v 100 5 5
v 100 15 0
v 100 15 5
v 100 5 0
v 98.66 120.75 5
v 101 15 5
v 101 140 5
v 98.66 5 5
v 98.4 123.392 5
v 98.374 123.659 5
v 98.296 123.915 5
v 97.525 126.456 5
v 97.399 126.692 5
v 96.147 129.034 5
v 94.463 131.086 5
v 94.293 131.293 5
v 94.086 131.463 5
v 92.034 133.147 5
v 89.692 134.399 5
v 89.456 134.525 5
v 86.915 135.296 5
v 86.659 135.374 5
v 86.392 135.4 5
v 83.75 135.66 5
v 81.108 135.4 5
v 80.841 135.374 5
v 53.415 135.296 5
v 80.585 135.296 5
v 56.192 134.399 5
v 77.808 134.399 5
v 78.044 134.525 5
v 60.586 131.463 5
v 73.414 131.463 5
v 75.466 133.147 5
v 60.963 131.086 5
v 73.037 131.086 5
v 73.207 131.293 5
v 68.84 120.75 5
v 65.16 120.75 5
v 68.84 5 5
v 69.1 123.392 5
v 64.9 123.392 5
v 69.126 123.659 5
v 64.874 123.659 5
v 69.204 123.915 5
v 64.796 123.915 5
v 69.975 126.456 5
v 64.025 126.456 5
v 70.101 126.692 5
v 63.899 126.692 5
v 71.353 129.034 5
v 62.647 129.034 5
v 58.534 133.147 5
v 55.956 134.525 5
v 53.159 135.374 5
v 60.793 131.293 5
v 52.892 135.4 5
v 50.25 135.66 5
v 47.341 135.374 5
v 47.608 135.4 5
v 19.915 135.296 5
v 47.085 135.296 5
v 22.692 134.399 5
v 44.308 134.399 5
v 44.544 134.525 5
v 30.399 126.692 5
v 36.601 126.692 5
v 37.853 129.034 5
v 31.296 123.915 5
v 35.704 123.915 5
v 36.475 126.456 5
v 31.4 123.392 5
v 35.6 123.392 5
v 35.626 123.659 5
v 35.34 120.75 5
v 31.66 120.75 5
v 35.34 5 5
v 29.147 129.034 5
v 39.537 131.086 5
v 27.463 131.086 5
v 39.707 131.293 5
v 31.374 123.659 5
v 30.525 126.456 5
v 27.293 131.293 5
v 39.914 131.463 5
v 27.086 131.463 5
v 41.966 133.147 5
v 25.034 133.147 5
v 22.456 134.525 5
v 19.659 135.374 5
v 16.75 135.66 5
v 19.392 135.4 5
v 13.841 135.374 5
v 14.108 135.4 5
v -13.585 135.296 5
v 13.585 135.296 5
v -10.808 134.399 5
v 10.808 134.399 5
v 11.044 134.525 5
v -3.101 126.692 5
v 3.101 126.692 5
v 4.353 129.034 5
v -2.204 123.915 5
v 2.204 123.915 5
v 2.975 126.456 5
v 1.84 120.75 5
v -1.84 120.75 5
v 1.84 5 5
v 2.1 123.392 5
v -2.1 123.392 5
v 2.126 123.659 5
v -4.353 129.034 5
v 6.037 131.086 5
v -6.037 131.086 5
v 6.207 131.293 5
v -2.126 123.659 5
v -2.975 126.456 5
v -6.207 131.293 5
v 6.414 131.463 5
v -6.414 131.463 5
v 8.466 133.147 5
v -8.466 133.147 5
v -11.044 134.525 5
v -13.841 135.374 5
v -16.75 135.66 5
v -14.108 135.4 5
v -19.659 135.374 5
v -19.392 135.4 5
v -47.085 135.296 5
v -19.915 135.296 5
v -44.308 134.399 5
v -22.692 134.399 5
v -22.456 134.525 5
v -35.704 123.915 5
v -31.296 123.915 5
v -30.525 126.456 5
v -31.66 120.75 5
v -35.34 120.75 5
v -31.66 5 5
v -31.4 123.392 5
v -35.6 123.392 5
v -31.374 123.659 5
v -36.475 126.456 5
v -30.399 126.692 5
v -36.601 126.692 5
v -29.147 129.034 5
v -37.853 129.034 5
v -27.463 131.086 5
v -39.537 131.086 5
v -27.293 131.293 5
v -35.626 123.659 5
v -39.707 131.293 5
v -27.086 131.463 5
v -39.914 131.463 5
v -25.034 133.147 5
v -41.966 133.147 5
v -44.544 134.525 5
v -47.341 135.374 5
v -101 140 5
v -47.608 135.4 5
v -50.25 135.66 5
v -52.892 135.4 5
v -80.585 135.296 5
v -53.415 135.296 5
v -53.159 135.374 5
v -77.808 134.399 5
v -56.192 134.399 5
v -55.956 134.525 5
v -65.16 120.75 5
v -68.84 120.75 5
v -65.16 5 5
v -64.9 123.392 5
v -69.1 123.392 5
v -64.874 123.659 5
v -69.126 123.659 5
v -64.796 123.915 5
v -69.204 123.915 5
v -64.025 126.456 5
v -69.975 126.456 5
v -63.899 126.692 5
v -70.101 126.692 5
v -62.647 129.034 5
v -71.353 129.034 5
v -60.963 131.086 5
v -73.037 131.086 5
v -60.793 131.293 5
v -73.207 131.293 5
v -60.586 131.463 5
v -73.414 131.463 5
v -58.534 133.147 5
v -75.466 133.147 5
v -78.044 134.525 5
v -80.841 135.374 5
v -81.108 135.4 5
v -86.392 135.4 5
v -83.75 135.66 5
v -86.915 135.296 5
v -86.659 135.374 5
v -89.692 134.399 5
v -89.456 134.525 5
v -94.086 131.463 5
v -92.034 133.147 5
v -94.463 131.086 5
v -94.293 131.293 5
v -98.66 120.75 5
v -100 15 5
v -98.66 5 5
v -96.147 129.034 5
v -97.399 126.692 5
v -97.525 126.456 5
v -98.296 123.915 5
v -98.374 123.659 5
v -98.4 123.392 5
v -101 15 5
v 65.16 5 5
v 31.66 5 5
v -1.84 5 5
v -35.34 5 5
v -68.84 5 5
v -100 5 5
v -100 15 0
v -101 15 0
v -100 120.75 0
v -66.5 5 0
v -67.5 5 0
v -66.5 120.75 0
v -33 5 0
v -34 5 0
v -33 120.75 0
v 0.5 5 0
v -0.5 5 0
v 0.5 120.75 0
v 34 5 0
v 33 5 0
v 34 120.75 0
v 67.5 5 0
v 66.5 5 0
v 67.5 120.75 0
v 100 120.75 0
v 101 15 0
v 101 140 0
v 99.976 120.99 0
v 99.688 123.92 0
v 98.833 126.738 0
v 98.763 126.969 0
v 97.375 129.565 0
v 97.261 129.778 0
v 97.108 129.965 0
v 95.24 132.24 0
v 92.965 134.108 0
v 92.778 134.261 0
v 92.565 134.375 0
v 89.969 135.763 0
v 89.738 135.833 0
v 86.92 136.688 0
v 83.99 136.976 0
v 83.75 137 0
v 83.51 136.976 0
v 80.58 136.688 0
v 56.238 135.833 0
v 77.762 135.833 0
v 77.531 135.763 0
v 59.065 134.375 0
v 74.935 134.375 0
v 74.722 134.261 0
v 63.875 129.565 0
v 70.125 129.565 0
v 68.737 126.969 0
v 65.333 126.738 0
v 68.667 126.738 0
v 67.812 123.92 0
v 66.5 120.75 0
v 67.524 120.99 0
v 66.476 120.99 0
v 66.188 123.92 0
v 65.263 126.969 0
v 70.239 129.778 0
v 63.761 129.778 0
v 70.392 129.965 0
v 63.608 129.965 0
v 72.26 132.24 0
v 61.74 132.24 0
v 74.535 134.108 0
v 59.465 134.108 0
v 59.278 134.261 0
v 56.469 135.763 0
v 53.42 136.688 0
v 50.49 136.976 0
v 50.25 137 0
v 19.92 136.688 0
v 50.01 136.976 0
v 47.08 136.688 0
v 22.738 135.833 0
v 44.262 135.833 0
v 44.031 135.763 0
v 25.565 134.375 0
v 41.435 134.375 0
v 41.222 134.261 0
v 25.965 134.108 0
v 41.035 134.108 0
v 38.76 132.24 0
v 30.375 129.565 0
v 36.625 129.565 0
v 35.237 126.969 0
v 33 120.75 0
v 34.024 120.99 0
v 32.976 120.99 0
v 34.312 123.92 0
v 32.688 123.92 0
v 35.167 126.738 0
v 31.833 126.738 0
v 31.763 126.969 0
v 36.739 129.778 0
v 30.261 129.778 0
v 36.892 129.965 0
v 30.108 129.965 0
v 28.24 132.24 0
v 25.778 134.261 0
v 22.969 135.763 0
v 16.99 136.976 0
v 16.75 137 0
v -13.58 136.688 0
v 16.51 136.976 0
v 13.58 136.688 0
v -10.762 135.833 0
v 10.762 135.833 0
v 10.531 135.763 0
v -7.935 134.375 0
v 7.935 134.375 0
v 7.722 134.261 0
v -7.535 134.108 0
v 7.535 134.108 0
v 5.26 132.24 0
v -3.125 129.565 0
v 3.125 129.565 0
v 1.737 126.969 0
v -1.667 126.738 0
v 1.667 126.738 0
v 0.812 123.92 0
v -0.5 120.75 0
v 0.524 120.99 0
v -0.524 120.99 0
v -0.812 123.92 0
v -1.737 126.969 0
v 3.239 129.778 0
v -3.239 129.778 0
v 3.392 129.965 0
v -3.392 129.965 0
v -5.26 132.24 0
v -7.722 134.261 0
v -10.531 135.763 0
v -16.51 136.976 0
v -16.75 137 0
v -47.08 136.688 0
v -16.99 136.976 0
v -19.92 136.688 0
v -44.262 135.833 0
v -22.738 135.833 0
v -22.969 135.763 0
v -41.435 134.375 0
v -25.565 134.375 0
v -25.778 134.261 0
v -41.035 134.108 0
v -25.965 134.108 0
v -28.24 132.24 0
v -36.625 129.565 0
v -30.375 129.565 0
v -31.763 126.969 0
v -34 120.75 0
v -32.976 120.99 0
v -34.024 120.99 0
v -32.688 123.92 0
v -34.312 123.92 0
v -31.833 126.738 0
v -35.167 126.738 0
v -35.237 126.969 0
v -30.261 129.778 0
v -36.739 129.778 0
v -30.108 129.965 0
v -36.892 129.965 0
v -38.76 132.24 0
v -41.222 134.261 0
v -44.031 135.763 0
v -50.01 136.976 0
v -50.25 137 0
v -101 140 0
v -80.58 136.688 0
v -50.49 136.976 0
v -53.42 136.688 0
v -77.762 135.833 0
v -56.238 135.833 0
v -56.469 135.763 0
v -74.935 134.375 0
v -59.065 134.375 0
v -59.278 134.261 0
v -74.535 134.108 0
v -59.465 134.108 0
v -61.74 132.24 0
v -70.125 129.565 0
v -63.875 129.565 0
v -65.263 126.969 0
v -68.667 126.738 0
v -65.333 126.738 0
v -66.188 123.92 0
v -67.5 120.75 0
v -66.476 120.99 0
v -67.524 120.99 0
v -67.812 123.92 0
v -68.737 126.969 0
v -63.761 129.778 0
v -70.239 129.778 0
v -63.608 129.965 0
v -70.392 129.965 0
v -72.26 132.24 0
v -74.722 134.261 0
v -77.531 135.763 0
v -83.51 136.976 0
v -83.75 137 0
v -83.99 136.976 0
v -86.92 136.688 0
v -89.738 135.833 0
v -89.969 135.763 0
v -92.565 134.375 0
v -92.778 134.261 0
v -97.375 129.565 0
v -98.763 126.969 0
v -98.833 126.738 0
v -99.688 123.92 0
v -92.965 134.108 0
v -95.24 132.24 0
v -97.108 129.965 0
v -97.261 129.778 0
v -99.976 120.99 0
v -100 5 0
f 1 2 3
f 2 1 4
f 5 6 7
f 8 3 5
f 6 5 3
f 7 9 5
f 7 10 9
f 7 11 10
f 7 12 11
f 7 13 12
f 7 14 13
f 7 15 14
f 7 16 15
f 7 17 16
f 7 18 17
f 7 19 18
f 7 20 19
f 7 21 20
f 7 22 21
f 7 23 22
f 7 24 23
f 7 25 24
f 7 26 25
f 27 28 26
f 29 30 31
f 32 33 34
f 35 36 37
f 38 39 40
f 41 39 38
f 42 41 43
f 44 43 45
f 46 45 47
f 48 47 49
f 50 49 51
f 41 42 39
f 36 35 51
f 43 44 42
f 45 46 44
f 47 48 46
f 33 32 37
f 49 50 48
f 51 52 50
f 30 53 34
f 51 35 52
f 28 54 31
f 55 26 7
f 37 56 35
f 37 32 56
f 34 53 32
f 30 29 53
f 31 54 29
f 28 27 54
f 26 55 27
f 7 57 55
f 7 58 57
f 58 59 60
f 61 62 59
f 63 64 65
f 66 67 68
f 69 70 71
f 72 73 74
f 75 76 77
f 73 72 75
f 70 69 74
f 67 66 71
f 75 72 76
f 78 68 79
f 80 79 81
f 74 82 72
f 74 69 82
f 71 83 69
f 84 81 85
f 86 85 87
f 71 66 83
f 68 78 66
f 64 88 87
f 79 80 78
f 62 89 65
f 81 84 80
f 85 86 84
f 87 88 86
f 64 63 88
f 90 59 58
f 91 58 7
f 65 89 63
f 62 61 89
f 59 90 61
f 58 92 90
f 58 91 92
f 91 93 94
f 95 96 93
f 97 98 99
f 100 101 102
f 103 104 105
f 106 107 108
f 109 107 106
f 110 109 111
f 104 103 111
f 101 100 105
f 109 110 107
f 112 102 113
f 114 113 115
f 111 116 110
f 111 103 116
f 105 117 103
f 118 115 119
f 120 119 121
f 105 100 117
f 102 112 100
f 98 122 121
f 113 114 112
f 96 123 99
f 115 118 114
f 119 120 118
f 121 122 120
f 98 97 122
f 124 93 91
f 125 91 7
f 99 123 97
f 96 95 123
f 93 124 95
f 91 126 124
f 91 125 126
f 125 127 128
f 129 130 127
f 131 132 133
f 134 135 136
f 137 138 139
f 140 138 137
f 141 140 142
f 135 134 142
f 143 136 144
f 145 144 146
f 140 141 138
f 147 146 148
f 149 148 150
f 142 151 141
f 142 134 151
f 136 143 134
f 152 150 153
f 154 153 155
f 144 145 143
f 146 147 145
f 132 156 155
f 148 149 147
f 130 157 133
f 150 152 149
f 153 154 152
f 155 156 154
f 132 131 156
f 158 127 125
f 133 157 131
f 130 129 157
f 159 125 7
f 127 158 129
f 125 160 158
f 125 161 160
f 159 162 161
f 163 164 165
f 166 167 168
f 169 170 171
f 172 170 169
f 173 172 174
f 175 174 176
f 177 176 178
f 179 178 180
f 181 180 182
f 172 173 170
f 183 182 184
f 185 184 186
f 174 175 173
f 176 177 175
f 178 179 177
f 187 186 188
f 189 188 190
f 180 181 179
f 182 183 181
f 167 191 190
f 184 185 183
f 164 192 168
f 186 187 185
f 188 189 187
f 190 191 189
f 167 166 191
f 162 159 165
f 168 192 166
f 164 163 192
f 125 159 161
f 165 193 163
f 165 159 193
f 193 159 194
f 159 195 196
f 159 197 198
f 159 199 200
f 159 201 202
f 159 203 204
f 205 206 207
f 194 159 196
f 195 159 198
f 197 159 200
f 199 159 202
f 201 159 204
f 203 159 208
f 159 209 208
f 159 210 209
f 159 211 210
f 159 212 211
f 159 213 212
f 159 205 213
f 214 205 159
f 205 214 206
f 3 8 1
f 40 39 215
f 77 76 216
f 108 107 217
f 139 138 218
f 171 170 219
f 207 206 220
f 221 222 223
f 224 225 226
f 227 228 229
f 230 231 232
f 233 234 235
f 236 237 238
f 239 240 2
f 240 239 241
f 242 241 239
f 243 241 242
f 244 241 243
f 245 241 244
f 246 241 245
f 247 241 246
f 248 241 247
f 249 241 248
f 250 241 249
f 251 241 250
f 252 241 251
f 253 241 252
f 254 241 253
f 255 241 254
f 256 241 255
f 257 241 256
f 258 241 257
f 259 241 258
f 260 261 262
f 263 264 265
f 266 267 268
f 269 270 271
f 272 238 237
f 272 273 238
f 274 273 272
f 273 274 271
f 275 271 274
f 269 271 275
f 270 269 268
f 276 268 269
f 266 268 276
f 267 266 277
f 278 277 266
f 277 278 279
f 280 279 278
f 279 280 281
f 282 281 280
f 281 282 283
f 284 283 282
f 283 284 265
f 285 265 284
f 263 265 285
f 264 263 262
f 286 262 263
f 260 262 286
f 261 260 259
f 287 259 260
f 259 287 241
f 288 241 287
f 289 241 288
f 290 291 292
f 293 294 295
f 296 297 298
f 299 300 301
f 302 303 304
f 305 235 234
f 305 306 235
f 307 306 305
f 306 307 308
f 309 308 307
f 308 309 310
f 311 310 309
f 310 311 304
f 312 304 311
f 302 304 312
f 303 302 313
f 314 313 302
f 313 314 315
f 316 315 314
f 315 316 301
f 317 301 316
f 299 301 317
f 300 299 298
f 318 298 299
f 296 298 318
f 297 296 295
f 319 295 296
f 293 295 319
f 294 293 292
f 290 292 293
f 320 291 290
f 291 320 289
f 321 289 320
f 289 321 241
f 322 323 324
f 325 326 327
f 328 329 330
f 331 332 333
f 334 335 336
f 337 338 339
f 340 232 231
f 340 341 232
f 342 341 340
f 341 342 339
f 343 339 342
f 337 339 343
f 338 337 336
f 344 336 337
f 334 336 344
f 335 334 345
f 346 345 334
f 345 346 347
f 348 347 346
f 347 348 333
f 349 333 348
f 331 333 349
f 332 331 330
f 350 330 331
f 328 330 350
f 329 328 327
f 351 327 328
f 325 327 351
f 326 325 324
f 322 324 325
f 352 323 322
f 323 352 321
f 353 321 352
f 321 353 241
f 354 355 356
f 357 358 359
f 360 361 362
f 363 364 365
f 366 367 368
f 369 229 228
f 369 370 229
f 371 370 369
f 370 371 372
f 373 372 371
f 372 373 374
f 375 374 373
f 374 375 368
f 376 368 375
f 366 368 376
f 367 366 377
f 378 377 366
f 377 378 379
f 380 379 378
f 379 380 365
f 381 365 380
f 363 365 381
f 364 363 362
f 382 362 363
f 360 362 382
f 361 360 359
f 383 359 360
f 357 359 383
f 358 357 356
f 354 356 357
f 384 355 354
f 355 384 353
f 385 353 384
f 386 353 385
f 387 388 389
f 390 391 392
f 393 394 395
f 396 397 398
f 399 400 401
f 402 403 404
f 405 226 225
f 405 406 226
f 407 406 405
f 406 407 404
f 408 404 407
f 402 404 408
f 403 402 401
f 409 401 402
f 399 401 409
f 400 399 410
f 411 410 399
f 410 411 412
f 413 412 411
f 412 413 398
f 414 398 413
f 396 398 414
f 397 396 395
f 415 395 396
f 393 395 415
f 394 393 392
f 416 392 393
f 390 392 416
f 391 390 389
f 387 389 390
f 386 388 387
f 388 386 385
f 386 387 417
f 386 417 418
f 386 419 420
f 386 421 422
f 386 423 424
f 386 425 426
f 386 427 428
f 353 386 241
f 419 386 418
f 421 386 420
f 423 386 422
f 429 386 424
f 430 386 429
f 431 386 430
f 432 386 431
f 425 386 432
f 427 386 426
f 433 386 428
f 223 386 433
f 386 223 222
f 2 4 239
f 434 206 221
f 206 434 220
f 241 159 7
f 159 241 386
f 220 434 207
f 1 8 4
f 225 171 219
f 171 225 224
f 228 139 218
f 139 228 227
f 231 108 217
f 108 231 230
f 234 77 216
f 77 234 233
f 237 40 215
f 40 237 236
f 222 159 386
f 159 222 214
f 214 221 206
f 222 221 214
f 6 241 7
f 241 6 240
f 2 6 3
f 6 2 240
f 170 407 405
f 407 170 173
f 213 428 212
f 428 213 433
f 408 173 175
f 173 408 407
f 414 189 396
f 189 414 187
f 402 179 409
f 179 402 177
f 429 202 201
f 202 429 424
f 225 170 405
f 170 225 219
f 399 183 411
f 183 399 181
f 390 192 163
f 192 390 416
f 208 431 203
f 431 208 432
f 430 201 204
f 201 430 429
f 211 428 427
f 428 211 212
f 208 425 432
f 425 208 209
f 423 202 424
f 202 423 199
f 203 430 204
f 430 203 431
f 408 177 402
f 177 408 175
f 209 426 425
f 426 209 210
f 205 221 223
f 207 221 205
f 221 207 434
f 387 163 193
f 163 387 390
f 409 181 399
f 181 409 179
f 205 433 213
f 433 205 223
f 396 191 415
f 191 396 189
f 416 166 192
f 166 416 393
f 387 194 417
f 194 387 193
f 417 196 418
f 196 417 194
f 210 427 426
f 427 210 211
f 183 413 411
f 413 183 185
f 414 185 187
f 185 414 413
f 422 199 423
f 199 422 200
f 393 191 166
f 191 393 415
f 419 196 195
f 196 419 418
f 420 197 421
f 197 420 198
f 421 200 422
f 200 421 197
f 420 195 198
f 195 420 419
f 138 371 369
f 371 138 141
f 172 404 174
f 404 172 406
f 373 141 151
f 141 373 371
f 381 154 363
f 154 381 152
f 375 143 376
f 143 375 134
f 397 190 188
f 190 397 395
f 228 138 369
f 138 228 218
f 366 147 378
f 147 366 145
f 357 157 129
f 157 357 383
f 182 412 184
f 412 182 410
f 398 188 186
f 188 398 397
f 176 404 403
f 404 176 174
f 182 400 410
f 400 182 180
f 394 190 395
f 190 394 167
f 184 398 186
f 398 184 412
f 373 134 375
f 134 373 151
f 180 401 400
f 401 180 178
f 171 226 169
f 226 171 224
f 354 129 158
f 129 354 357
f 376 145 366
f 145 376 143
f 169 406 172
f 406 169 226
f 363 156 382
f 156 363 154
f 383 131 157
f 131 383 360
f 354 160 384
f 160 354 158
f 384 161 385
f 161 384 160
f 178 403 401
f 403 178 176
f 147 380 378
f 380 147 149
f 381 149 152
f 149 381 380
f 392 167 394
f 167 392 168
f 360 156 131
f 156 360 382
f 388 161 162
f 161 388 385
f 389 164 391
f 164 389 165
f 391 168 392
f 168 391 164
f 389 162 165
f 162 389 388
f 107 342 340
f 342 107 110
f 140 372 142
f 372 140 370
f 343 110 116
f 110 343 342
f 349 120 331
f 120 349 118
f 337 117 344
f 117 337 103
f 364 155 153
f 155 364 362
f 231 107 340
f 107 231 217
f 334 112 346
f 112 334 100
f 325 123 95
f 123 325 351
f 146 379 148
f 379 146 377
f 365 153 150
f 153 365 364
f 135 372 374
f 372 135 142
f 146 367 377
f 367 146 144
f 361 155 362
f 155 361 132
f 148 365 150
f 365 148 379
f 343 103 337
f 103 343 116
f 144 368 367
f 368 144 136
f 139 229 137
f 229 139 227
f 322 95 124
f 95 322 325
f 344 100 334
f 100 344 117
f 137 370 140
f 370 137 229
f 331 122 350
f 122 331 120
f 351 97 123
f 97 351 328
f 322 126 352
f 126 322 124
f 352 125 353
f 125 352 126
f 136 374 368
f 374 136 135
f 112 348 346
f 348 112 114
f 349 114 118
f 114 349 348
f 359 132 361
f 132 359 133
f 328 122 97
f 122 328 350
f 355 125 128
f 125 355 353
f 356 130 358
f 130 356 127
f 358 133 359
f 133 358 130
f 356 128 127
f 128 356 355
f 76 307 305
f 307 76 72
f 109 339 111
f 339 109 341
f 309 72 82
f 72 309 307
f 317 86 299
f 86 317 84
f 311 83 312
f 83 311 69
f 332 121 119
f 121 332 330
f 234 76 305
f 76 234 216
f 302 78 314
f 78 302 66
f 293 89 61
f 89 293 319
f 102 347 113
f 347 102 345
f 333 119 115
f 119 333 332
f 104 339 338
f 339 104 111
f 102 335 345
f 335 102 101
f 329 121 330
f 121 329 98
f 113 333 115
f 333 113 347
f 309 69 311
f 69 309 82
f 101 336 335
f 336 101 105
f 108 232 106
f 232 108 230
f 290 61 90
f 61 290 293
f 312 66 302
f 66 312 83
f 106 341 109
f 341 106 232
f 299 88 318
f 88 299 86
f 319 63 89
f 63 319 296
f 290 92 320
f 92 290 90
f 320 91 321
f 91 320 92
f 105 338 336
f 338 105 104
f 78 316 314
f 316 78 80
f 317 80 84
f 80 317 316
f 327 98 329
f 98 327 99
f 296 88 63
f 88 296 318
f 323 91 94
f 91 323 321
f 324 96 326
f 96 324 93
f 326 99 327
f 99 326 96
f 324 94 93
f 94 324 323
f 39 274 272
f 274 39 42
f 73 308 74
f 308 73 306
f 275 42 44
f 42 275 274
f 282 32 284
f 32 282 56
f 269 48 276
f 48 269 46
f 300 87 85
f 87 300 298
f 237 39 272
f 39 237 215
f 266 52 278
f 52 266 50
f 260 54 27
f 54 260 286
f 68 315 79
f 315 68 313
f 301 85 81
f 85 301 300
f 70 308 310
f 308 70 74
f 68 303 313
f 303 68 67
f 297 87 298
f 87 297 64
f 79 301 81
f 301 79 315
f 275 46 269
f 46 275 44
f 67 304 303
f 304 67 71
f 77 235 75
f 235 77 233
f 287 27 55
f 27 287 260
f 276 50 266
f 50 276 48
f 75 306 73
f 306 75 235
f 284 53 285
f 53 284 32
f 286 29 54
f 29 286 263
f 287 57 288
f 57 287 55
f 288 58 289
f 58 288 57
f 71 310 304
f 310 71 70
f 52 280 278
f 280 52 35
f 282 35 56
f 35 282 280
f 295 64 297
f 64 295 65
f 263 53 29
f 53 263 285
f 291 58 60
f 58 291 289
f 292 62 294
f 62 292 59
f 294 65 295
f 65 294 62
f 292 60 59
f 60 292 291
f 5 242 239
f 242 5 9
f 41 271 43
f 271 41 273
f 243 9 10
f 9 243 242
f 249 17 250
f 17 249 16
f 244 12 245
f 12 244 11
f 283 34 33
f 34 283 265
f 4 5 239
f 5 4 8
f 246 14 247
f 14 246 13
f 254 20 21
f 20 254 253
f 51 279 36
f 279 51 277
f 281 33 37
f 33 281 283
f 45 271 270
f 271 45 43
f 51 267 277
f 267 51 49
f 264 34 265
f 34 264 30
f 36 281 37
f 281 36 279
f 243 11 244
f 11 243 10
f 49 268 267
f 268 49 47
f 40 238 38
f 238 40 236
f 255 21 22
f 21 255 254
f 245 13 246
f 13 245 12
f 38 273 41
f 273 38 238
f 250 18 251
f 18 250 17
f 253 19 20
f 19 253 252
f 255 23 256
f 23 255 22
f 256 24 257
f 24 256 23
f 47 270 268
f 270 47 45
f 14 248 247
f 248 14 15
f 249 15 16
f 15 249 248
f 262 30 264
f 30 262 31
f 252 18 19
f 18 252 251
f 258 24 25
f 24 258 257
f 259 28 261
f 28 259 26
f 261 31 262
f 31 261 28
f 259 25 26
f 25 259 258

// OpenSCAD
// Parametric Tray Dividers for Warhammer Bases
// Generated for the Blank Shelf

/* [Base Settings] */
// Pass a list of slots here to mix sizes natively! e.g. [25, 25, 32, 40]
slot_diameters = [];

// Diameter of the bases you want to hold (in mm) (Fallback if slot_diameters is empty)
base_diameter = 32; 

// Height of the bevel on the base (in mm)
base_bevel_height = 5;

// The angle of the base edge from vertical (Warhammer standard is usually 15-20, measure yours to get exact fit)
base_angle = 15;

/* [Clearances & Barriers] */
// Extra width added to the slot so bases slide easily
clearance = 0.5;

// Width of the dividing walls between each base slot
barrier_width = 1.0;

// Barrier thickness at the back of the tray
back_barrier_width = 3;

// Gap at the open side (front of the tray) to make racks shorter
front_gap = 5;

/* [Shelf Dimensions] */
// Depth of the tray/shelf (from front to back)
shelf_depth = 140;

// Maximum available width of the tray
max_shelf_width = 217.7;

/* [Generation] */
// Number of slots. If -1, it will auto-calculate standard slots. (Fallback if slot_diameters is empty)
number_of_slots = -1; 

// Base connecting plate thickness (0 means separate rails connected only at the back, just like the image)
base_plate_thickness = 0;

// Merge the generated dividers physically with the Blank Shelf base?
merge_shelf = false;

// Offset to precisely perfectly the fusion (e.g. 0 sets floor at middle, 0.1 shifts shelf up)
shelf_z_offset = 0.1;

/* [Hidden] */
$fn = 32;

// Auto-calculate slots if using legacy mode
eff_dia = base_diameter + clearance;
slot_width = eff_dia + barrier_width;
n_slots_auto = floor((max_shelf_width - barrier_width) / slot_width);
n_slots_legacy = (number_of_slots > 0) ? number_of_slots : n_slots_auto;

// Identify active slots
active_slots = (len(slot_diameters) > 0) ? slot_diameters : [for (i=[1:n_slots_legacy]) base_diameter];
n_active = len(active_slots);

// Cumulative mathematical summing for mixed widths
function sum_dia(arr, end_idx, c) = 
    (end_idx < 0) ? 0 : 
    (arr[end_idx] + c) + sum_dia(arr, end_idx - 1, c);

function get_x_pos(slots, i, barrier, c) = 
    (i + 1) * barrier + sum_dia(slots, i - 1, c) + (slots[i] + c) / 2;

// Total exact width of the final plate based on the dynamic barriers
total_width = sum_dia(active_slots, n_active - 1, clearance) + (n_active + 1) * barrier_width;

module slot_negative_for(dia) {
    r1 = (dia + clearance) / 2;
    slot_length = shelf_depth - back_barrier_width - r1;
    z_shift = -0.5;
    r1_eff = r1 - z_shift * tan(base_angle);
    
    // Extrude slightly taller than base height for clean subtraction
    h_eff = base_bevel_height + 1.0;
    r2_eff = r1_eff - h_eff * tan(base_angle);
    
    translate([0, 0, z_shift]) {
        hull() {
            translate([0, slot_length, 0]) cylinder(h=h_eff, r1=r1_eff, r2=r2_eff);
            translate([0, -1, 0]) cylinder(h=h_eff, r1=r1_eff, r2=r2_eff);
        }
    }
}

module dividers() {
    difference() {
        // Build the solid body with the stepped front
        union() {
            // Main body for center sections
            if (n_active > 0) {
                translate([barrier_width, front_gap, 0])
                    cube([total_width - 2*barrier_width, shelf_depth - front_gap, base_bevel_height]);
            }
            
            // End walls (10mm recessed)
            translate([0, front_gap + 10, 0])
                cube([barrier_width, shelf_depth - (front_gap + 10), base_bevel_height]);
            translate([total_width - barrier_width, front_gap + 10, 0])
                cube([barrier_width, shelf_depth - (front_gap + 10), base_bevel_height]);
        }
        
        // Subtract the mixed base channels sequentially
        for(i = [0 : n_active - 1]) {
            x_pos = get_x_pos(active_slots, i, barrier_width, clearance);
            translate([x_pos, 0, 0])
                slot_negative_for(active_slots[i]);
        }
    }
    
    // Apply optional base plate bottom if needed
    if (base_plate_thickness > 0) {
        translate([0, front_gap, -base_plate_thickness])
            cube([total_width, shelf_depth - front_gap, base_plate_thickness]);
    }
}

// Generate the item centered on the X origin to match many slicing workflows.
if (merge_shelf) {
    union() {
        translate([-total_width/2, 0, 0])
            dividers();
        
        // Aligning the Blank shelf.stl (which is naturally standing on Z with its thickness on Y)
        // by rotating the other way to bed and translating so its top surface sits flush at Z=0.
        translate([0, 72.3, shelf_z_offset])
            rotate([90, 0, 0])
            import("Blank shelf.stl");
    }
} else {
    translate([-total_width/2, 0, 0])
        dividers();
}
